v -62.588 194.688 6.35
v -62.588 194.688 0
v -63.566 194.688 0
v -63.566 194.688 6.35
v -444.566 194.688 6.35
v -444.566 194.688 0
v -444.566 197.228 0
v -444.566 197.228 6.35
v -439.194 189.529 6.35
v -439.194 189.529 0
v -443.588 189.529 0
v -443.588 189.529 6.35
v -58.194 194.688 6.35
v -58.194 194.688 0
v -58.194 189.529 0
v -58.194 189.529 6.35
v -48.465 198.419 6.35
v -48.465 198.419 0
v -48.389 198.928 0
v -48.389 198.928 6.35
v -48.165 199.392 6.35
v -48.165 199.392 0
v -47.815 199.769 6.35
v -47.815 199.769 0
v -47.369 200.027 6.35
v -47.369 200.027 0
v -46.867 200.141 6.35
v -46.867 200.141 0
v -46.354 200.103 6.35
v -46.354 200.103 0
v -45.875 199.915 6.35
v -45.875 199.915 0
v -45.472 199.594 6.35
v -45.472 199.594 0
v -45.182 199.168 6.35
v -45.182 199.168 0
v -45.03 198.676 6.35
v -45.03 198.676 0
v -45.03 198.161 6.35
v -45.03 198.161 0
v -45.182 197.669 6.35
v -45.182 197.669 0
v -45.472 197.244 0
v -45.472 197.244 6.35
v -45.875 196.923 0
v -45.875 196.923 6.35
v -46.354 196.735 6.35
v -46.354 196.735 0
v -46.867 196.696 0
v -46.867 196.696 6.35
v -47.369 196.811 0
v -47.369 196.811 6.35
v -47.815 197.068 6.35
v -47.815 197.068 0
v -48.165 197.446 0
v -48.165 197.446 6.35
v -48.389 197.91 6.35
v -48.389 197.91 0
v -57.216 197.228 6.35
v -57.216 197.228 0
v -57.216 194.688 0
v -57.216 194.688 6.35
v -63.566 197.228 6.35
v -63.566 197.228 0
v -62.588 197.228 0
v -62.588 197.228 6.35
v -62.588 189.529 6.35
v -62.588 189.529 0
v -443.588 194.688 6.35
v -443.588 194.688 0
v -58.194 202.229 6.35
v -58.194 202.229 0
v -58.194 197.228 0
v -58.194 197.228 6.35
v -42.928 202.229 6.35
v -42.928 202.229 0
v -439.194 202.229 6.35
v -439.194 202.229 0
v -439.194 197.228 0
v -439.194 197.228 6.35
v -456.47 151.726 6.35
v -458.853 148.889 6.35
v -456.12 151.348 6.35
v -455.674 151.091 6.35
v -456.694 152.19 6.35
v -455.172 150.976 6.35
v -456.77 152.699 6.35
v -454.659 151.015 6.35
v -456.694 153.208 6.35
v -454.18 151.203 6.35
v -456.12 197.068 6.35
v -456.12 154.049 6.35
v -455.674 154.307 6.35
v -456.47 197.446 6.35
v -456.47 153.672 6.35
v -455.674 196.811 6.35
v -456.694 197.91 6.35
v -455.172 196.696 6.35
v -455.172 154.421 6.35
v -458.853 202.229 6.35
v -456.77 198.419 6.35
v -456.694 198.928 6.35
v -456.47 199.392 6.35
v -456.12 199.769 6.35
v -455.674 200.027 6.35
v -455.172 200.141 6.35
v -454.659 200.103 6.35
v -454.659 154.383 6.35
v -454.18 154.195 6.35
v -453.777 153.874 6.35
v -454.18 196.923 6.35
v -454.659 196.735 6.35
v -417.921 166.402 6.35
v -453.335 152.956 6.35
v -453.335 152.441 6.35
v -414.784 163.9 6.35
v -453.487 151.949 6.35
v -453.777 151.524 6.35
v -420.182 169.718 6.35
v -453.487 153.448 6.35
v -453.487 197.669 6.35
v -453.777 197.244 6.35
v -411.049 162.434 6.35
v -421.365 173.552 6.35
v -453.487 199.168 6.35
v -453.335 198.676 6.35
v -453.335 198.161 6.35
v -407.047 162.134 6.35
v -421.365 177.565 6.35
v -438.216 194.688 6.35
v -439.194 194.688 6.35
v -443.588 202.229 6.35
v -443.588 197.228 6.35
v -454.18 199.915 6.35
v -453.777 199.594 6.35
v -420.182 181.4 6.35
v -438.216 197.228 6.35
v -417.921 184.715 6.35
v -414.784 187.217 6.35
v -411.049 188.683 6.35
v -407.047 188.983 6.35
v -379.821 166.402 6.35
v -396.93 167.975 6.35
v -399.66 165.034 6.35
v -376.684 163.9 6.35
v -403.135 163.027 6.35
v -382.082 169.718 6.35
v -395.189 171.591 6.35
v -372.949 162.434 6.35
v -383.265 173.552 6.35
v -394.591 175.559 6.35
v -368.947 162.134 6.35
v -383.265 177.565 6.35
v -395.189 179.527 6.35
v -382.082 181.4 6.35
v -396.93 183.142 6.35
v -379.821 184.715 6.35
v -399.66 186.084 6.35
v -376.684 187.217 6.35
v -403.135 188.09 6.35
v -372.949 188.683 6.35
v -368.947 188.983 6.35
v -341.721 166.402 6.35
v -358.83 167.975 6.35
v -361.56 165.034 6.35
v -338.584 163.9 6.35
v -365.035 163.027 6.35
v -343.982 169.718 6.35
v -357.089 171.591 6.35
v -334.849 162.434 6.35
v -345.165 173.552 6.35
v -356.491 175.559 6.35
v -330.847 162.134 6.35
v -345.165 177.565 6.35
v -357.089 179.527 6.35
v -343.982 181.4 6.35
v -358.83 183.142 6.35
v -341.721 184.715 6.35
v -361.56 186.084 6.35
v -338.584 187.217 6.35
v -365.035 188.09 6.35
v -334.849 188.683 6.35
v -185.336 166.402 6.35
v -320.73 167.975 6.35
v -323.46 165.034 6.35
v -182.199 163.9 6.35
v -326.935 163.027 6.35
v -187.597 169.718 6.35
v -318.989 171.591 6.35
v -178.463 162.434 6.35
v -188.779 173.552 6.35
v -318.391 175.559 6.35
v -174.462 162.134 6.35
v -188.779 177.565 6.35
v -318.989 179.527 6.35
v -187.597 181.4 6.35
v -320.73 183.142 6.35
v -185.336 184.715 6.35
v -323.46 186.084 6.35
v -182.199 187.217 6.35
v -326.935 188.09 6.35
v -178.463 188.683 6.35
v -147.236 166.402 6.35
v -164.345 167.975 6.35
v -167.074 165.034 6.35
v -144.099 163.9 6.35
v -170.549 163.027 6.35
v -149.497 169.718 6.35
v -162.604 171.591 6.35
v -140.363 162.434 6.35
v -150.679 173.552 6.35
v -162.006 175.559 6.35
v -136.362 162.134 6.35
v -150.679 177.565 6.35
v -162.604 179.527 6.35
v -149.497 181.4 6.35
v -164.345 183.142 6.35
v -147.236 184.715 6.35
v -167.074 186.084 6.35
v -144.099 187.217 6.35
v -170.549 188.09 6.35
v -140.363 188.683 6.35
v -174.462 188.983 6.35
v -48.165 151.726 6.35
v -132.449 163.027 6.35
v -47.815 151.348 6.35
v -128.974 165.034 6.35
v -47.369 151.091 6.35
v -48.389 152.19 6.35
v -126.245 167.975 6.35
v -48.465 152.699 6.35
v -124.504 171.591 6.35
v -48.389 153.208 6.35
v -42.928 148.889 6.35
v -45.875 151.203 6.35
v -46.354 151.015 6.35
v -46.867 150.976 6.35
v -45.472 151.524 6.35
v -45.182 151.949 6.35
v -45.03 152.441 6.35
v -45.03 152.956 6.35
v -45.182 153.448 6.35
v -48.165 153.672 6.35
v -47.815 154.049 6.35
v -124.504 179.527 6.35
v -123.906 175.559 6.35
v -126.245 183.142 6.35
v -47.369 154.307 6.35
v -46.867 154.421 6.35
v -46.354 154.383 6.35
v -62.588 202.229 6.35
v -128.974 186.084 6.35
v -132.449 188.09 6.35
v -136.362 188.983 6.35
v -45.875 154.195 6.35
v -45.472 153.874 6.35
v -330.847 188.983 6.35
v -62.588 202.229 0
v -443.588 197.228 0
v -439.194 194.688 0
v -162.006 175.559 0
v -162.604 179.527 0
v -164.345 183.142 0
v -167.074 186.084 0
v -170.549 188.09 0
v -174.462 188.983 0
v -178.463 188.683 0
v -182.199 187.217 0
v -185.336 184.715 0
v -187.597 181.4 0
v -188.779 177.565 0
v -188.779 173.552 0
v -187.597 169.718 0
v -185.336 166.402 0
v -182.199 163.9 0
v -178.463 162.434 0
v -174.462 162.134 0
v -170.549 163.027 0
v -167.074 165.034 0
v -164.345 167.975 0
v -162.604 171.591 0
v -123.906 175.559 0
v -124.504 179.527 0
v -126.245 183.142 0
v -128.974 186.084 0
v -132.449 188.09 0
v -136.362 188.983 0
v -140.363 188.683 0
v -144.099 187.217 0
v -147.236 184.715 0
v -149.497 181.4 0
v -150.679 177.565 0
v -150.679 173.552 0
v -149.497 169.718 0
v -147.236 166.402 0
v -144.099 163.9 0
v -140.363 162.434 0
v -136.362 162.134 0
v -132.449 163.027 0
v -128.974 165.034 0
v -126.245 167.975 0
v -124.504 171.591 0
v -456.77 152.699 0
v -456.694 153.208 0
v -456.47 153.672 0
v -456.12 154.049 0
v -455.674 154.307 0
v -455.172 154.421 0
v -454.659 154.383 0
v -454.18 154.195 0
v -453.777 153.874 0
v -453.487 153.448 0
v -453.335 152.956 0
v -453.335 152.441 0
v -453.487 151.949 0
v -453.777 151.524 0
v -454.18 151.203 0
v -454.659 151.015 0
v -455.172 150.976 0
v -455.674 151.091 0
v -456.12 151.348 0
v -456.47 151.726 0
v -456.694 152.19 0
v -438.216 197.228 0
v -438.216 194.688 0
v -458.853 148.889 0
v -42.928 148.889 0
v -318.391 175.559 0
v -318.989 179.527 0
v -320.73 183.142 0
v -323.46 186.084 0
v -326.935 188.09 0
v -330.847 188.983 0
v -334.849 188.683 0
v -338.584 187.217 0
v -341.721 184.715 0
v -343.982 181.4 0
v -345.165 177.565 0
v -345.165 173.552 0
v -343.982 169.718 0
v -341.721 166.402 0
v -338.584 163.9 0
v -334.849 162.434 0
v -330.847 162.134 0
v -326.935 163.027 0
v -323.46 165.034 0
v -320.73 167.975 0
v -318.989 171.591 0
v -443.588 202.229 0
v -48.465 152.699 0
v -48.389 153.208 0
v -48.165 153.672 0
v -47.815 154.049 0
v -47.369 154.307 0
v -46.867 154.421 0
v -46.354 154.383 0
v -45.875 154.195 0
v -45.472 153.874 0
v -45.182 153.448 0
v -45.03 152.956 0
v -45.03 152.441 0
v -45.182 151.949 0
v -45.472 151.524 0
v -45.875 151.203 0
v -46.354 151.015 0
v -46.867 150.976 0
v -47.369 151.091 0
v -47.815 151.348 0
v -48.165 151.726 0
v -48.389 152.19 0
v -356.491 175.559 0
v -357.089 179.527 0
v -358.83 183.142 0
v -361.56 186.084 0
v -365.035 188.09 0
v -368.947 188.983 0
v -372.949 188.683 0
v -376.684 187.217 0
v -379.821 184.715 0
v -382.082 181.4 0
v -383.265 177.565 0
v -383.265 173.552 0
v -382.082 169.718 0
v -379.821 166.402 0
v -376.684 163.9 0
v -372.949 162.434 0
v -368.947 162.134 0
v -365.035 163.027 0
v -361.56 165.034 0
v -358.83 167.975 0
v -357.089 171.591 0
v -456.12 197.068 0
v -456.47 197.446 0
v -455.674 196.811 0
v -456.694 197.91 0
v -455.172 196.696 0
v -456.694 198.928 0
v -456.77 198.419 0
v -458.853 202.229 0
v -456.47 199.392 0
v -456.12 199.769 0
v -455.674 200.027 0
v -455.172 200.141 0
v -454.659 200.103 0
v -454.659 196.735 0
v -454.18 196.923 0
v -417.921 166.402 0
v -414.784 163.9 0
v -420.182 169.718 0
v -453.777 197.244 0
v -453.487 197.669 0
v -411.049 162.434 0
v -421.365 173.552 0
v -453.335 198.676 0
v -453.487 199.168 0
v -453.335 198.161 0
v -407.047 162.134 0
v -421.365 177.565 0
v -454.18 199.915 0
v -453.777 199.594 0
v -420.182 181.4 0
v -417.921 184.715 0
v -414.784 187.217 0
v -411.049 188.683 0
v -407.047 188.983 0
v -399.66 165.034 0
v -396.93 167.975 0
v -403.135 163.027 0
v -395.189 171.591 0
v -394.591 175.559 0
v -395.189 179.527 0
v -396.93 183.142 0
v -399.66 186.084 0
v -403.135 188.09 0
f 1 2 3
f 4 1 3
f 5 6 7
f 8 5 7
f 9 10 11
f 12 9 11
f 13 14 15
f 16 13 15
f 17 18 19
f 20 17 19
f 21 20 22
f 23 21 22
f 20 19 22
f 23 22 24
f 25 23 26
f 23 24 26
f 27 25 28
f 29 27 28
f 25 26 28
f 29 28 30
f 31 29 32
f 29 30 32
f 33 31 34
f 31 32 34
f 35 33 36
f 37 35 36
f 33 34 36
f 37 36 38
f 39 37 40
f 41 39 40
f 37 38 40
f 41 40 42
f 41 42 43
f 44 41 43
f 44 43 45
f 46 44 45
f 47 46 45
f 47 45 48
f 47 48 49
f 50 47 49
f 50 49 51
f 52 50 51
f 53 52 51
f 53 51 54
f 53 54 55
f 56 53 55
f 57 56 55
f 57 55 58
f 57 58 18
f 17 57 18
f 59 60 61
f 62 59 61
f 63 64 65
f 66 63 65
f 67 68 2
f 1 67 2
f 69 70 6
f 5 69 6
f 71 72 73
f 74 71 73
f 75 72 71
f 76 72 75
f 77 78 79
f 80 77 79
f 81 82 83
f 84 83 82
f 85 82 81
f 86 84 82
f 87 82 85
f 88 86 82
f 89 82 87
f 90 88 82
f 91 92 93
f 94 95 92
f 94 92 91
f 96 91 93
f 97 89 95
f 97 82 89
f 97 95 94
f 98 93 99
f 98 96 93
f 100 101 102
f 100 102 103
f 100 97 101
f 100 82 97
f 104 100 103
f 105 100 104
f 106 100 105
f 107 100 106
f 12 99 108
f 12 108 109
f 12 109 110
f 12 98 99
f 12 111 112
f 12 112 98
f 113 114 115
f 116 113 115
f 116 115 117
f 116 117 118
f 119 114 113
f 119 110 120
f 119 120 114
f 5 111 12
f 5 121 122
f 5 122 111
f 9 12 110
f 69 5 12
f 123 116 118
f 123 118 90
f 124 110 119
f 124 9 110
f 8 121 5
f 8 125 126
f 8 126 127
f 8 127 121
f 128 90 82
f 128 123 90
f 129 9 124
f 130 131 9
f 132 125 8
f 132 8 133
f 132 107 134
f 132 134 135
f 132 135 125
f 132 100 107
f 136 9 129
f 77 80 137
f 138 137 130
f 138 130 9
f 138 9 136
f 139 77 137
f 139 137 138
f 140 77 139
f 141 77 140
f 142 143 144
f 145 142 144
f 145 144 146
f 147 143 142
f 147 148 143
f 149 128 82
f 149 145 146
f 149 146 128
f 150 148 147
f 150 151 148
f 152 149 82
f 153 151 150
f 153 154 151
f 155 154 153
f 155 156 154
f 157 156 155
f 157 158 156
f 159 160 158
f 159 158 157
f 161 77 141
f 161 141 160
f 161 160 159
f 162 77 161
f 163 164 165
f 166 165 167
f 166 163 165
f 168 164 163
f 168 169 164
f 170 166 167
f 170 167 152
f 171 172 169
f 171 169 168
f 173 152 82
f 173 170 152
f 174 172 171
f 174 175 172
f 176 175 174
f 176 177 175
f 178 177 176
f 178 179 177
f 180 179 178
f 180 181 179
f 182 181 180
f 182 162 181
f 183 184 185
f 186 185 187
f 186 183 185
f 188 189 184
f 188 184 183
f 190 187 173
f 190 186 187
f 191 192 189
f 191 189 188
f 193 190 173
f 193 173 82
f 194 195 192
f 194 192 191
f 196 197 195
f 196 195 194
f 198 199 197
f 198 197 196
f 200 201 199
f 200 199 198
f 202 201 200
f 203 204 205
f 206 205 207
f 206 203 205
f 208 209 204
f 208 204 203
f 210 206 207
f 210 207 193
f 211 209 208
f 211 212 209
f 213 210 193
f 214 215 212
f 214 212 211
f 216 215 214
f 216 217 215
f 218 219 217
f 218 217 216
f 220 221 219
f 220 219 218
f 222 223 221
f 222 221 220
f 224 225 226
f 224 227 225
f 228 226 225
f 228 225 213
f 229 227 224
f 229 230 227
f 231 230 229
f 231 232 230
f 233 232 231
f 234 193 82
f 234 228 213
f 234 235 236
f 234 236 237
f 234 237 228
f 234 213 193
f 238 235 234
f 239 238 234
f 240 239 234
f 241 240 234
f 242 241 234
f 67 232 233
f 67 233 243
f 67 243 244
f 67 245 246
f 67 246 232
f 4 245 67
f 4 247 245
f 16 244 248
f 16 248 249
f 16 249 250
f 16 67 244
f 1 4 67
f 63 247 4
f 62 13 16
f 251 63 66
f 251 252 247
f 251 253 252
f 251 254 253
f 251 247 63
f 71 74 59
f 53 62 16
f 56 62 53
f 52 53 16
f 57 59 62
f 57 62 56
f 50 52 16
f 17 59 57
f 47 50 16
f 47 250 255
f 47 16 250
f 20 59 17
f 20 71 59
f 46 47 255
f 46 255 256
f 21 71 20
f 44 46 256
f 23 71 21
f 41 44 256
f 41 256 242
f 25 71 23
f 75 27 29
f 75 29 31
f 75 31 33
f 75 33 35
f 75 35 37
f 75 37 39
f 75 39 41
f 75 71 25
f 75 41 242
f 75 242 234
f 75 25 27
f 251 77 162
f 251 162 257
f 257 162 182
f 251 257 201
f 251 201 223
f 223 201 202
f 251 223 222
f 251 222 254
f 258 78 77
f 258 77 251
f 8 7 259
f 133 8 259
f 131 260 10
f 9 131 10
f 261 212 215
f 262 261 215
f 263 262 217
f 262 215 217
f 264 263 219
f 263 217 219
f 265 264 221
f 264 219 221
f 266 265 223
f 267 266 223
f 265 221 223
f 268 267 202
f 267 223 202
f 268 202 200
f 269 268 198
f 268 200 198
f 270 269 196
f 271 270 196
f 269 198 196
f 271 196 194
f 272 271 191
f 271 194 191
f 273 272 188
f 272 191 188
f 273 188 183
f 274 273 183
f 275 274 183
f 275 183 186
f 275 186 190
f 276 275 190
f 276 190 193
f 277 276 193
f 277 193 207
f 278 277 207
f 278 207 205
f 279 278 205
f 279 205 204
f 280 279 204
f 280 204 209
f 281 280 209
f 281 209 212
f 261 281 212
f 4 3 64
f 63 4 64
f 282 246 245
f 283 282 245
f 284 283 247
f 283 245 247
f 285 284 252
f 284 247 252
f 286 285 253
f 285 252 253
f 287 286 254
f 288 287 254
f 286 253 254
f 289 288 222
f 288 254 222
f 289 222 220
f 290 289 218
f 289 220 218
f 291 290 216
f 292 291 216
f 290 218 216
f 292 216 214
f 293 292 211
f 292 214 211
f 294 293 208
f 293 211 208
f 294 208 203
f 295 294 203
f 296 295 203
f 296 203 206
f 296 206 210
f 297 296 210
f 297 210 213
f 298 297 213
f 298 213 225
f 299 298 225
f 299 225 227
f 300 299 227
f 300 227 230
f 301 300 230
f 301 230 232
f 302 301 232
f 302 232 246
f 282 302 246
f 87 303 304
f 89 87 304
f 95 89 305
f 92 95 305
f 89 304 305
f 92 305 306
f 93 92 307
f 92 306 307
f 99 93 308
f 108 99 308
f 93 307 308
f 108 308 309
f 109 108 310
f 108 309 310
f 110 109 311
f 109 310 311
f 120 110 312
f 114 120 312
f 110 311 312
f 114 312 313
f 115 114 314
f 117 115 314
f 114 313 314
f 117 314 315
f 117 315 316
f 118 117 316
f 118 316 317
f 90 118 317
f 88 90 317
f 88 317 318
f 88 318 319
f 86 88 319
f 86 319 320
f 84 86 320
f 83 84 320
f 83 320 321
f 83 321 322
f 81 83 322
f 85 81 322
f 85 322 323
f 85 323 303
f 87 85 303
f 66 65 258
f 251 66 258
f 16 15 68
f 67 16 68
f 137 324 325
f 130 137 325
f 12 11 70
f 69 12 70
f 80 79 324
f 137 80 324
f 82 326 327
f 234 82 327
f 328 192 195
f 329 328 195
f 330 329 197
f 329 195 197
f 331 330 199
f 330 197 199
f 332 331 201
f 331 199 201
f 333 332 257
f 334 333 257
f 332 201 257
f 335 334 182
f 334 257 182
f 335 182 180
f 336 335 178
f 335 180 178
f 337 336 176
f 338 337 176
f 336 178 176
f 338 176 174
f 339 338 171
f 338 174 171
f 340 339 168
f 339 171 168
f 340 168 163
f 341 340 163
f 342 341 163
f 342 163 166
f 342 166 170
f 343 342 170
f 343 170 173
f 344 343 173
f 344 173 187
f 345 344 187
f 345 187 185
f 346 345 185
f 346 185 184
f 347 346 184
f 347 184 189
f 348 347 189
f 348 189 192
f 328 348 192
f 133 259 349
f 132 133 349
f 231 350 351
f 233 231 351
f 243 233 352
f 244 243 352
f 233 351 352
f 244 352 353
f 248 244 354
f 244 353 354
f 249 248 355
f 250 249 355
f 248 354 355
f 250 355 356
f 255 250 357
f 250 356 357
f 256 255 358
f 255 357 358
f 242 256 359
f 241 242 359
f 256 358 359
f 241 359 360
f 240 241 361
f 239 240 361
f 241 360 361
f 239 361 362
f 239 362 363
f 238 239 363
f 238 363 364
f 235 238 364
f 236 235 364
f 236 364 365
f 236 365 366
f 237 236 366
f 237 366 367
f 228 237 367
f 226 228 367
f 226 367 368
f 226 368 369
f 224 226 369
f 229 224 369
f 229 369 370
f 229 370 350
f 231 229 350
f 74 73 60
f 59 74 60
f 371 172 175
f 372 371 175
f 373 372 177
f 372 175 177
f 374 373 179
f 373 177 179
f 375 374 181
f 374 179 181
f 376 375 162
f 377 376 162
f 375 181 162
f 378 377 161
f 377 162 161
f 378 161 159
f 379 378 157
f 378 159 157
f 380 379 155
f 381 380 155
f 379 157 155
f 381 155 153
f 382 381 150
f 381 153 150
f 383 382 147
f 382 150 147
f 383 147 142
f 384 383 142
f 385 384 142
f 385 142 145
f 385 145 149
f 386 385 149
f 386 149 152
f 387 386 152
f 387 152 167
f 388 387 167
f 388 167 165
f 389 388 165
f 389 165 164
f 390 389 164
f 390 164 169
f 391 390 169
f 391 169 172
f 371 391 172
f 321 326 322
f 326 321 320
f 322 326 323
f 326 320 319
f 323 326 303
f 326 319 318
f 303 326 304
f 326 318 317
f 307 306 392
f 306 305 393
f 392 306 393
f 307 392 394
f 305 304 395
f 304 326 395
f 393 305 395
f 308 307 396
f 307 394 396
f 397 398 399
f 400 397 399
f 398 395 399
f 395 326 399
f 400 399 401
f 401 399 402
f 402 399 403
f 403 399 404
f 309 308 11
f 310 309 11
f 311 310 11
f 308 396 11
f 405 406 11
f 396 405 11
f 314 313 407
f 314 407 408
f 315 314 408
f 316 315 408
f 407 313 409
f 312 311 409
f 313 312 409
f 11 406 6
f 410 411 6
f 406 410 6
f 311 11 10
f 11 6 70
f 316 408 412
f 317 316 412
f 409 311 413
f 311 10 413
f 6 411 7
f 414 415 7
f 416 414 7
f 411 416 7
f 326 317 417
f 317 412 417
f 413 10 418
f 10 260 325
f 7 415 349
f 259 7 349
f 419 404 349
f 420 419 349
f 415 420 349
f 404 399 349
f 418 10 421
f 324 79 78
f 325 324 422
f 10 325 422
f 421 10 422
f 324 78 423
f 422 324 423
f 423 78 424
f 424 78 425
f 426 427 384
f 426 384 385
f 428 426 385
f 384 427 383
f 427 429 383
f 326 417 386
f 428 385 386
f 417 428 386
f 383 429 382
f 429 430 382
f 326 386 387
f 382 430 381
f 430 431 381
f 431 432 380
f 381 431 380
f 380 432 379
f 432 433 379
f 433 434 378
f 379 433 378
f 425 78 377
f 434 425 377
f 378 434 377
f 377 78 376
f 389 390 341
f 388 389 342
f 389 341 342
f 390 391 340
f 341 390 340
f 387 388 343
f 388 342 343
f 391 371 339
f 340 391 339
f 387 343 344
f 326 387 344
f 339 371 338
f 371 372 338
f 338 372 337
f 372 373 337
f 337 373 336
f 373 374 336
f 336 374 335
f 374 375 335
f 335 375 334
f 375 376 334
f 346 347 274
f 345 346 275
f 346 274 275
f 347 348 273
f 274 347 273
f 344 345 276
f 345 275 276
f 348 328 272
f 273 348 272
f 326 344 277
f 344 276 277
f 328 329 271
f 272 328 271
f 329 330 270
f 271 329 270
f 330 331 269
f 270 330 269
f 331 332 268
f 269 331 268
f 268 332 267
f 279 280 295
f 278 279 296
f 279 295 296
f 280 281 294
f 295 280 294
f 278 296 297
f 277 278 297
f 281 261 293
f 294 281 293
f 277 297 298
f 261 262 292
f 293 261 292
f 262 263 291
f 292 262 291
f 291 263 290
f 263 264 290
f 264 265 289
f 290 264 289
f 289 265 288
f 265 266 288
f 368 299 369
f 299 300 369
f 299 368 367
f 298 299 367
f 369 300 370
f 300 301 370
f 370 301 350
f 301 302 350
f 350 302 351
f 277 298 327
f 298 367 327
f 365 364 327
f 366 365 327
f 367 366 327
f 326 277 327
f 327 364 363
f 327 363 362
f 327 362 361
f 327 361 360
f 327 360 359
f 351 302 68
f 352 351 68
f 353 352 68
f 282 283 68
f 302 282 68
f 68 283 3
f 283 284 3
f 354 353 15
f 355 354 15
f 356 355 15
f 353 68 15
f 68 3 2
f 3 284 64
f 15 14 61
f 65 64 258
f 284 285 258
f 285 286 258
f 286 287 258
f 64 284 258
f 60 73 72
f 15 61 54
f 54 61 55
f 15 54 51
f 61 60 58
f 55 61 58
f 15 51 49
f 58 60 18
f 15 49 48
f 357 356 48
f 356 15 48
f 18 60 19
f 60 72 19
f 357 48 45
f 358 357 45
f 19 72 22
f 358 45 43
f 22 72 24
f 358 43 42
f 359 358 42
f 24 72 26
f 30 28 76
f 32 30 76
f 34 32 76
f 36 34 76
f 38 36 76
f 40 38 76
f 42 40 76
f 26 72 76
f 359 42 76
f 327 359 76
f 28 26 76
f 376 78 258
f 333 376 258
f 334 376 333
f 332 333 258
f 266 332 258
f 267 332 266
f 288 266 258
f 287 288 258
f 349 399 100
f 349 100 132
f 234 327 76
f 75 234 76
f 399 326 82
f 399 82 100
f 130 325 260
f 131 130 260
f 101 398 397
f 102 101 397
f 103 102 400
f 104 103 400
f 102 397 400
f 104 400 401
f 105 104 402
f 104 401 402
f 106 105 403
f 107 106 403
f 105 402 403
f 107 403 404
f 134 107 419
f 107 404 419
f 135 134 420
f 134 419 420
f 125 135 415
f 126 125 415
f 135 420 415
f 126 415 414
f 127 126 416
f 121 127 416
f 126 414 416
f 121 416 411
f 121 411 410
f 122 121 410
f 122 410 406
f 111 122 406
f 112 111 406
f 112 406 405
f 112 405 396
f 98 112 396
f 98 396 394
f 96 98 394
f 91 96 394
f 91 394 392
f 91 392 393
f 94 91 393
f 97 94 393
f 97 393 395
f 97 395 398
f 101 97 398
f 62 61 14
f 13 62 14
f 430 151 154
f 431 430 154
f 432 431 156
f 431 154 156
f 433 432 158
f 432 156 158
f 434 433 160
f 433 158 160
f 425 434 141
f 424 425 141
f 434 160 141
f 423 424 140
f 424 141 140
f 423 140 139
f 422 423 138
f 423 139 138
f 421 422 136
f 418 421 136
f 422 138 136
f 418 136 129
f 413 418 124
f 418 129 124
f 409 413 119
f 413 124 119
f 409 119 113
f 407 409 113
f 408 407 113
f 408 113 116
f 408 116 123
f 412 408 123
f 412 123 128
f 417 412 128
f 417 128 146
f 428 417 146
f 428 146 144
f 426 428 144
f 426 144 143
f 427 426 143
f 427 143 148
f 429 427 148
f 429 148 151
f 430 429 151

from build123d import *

# Parameters (mm, degrees)
SKETCH1_W                   = 415.925
SKETCH1_H                   = 53.34
BOSS_EXTRUDE1_DEPTH         = 6.35
SKETCH6_R                   = 13.462
CUT_EXTRUDE4_DEPTH          = 502.480799104
F_29_0_136_DIAMETER_HOLE1_D = 3.4544
CUT_EXTRUDE3_DEPTH          = 502.480799104


with BuildPart() as part:
    # Sketch1 → Boss-Extrude1 (new body)
    with BuildSketch(Plane.XY):
        with Locations((-250.890650119, 175.558721987)):
            Rectangle(SKETCH1_W, SKETCH1_H)
    extrude(amount=BOSS_EXTRUDE1_DEPTH)

    # Sketch6 → Cut-Extrude4 (cut, through all)
    with BuildSketch(Plane.XY.offset(6.35)):
        with Locations((-408.053150119, 175.558721987)):
            Circle(SKETCH6_R)
        with Locations((-175.467685368, 175.558721987)):
            Circle(SKETCH6_R)
        with Locations((-369.953150119, 175.558721987)):
            Circle(SKETCH6_R)
        with Locations((-331.853150119, 175.558721987)):
            Circle(SKETCH6_R)
        with Locations((-137.367685368, 175.558721987)):
            Circle(SKETCH6_R)
    extrude(amount=-CUT_EXTRUDE4_DEPTH, mode=Mode.SUBTRACT)

    # #29 (0.136) Diameter Hole1 (through all)
    with Locations(Plane.XY.offset(6.35)):
        with Locations((-455.043150119, 198.418721987), (-455.043150119, 152.698721987), (-46.738150119, 198.418721987), (-46.738150119, 152.698721987)):
            Hole(F_29_0_136_DIAMETER_HOLE1_D / 2)

    # Sketch5 → Cut-Extrude3 (cut, through all)
    with BuildSketch(Plane(origin=(0, 0, 0), x_dir=(-1, 0, 0), z_dir=(0, 0, -1))):
        Polygon((443.587750119, 202.228721987), (439.193550119, 202.228721987), (439.193550119, 197.228096987), (438.215650119, 197.228096987), (438.215650119, 194.688096987), (439.193550119, 194.688096987), (439.193550119, 189.528721987), (443.587750119, 189.528721987), (443.587750119, 194.688096987), (444.565650119, 194.688096987), (444.565650119, 197.228096987), (443.587750119, 197.228096987), align=None)
        Polygon((62.587750119, 202.228721987), (58.193550119, 202.228721987), (58.193550119, 197.228096987), (57.215650119, 197.228096987), (57.215650119, 194.688096987), (58.193550119, 194.688096987), (58.193550119, 189.528721987), (62.587750119, 189.528721987), (62.587750119, 194.688096987), (63.565650119, 194.688096987), (63.565650119, 197.228096987), (62.587750119, 197.228096987), align=None)
    extrude(amount=-CUT_EXTRUDE3_DEPTH, mode=Mode.SUBTRACT)


solid = part.part
